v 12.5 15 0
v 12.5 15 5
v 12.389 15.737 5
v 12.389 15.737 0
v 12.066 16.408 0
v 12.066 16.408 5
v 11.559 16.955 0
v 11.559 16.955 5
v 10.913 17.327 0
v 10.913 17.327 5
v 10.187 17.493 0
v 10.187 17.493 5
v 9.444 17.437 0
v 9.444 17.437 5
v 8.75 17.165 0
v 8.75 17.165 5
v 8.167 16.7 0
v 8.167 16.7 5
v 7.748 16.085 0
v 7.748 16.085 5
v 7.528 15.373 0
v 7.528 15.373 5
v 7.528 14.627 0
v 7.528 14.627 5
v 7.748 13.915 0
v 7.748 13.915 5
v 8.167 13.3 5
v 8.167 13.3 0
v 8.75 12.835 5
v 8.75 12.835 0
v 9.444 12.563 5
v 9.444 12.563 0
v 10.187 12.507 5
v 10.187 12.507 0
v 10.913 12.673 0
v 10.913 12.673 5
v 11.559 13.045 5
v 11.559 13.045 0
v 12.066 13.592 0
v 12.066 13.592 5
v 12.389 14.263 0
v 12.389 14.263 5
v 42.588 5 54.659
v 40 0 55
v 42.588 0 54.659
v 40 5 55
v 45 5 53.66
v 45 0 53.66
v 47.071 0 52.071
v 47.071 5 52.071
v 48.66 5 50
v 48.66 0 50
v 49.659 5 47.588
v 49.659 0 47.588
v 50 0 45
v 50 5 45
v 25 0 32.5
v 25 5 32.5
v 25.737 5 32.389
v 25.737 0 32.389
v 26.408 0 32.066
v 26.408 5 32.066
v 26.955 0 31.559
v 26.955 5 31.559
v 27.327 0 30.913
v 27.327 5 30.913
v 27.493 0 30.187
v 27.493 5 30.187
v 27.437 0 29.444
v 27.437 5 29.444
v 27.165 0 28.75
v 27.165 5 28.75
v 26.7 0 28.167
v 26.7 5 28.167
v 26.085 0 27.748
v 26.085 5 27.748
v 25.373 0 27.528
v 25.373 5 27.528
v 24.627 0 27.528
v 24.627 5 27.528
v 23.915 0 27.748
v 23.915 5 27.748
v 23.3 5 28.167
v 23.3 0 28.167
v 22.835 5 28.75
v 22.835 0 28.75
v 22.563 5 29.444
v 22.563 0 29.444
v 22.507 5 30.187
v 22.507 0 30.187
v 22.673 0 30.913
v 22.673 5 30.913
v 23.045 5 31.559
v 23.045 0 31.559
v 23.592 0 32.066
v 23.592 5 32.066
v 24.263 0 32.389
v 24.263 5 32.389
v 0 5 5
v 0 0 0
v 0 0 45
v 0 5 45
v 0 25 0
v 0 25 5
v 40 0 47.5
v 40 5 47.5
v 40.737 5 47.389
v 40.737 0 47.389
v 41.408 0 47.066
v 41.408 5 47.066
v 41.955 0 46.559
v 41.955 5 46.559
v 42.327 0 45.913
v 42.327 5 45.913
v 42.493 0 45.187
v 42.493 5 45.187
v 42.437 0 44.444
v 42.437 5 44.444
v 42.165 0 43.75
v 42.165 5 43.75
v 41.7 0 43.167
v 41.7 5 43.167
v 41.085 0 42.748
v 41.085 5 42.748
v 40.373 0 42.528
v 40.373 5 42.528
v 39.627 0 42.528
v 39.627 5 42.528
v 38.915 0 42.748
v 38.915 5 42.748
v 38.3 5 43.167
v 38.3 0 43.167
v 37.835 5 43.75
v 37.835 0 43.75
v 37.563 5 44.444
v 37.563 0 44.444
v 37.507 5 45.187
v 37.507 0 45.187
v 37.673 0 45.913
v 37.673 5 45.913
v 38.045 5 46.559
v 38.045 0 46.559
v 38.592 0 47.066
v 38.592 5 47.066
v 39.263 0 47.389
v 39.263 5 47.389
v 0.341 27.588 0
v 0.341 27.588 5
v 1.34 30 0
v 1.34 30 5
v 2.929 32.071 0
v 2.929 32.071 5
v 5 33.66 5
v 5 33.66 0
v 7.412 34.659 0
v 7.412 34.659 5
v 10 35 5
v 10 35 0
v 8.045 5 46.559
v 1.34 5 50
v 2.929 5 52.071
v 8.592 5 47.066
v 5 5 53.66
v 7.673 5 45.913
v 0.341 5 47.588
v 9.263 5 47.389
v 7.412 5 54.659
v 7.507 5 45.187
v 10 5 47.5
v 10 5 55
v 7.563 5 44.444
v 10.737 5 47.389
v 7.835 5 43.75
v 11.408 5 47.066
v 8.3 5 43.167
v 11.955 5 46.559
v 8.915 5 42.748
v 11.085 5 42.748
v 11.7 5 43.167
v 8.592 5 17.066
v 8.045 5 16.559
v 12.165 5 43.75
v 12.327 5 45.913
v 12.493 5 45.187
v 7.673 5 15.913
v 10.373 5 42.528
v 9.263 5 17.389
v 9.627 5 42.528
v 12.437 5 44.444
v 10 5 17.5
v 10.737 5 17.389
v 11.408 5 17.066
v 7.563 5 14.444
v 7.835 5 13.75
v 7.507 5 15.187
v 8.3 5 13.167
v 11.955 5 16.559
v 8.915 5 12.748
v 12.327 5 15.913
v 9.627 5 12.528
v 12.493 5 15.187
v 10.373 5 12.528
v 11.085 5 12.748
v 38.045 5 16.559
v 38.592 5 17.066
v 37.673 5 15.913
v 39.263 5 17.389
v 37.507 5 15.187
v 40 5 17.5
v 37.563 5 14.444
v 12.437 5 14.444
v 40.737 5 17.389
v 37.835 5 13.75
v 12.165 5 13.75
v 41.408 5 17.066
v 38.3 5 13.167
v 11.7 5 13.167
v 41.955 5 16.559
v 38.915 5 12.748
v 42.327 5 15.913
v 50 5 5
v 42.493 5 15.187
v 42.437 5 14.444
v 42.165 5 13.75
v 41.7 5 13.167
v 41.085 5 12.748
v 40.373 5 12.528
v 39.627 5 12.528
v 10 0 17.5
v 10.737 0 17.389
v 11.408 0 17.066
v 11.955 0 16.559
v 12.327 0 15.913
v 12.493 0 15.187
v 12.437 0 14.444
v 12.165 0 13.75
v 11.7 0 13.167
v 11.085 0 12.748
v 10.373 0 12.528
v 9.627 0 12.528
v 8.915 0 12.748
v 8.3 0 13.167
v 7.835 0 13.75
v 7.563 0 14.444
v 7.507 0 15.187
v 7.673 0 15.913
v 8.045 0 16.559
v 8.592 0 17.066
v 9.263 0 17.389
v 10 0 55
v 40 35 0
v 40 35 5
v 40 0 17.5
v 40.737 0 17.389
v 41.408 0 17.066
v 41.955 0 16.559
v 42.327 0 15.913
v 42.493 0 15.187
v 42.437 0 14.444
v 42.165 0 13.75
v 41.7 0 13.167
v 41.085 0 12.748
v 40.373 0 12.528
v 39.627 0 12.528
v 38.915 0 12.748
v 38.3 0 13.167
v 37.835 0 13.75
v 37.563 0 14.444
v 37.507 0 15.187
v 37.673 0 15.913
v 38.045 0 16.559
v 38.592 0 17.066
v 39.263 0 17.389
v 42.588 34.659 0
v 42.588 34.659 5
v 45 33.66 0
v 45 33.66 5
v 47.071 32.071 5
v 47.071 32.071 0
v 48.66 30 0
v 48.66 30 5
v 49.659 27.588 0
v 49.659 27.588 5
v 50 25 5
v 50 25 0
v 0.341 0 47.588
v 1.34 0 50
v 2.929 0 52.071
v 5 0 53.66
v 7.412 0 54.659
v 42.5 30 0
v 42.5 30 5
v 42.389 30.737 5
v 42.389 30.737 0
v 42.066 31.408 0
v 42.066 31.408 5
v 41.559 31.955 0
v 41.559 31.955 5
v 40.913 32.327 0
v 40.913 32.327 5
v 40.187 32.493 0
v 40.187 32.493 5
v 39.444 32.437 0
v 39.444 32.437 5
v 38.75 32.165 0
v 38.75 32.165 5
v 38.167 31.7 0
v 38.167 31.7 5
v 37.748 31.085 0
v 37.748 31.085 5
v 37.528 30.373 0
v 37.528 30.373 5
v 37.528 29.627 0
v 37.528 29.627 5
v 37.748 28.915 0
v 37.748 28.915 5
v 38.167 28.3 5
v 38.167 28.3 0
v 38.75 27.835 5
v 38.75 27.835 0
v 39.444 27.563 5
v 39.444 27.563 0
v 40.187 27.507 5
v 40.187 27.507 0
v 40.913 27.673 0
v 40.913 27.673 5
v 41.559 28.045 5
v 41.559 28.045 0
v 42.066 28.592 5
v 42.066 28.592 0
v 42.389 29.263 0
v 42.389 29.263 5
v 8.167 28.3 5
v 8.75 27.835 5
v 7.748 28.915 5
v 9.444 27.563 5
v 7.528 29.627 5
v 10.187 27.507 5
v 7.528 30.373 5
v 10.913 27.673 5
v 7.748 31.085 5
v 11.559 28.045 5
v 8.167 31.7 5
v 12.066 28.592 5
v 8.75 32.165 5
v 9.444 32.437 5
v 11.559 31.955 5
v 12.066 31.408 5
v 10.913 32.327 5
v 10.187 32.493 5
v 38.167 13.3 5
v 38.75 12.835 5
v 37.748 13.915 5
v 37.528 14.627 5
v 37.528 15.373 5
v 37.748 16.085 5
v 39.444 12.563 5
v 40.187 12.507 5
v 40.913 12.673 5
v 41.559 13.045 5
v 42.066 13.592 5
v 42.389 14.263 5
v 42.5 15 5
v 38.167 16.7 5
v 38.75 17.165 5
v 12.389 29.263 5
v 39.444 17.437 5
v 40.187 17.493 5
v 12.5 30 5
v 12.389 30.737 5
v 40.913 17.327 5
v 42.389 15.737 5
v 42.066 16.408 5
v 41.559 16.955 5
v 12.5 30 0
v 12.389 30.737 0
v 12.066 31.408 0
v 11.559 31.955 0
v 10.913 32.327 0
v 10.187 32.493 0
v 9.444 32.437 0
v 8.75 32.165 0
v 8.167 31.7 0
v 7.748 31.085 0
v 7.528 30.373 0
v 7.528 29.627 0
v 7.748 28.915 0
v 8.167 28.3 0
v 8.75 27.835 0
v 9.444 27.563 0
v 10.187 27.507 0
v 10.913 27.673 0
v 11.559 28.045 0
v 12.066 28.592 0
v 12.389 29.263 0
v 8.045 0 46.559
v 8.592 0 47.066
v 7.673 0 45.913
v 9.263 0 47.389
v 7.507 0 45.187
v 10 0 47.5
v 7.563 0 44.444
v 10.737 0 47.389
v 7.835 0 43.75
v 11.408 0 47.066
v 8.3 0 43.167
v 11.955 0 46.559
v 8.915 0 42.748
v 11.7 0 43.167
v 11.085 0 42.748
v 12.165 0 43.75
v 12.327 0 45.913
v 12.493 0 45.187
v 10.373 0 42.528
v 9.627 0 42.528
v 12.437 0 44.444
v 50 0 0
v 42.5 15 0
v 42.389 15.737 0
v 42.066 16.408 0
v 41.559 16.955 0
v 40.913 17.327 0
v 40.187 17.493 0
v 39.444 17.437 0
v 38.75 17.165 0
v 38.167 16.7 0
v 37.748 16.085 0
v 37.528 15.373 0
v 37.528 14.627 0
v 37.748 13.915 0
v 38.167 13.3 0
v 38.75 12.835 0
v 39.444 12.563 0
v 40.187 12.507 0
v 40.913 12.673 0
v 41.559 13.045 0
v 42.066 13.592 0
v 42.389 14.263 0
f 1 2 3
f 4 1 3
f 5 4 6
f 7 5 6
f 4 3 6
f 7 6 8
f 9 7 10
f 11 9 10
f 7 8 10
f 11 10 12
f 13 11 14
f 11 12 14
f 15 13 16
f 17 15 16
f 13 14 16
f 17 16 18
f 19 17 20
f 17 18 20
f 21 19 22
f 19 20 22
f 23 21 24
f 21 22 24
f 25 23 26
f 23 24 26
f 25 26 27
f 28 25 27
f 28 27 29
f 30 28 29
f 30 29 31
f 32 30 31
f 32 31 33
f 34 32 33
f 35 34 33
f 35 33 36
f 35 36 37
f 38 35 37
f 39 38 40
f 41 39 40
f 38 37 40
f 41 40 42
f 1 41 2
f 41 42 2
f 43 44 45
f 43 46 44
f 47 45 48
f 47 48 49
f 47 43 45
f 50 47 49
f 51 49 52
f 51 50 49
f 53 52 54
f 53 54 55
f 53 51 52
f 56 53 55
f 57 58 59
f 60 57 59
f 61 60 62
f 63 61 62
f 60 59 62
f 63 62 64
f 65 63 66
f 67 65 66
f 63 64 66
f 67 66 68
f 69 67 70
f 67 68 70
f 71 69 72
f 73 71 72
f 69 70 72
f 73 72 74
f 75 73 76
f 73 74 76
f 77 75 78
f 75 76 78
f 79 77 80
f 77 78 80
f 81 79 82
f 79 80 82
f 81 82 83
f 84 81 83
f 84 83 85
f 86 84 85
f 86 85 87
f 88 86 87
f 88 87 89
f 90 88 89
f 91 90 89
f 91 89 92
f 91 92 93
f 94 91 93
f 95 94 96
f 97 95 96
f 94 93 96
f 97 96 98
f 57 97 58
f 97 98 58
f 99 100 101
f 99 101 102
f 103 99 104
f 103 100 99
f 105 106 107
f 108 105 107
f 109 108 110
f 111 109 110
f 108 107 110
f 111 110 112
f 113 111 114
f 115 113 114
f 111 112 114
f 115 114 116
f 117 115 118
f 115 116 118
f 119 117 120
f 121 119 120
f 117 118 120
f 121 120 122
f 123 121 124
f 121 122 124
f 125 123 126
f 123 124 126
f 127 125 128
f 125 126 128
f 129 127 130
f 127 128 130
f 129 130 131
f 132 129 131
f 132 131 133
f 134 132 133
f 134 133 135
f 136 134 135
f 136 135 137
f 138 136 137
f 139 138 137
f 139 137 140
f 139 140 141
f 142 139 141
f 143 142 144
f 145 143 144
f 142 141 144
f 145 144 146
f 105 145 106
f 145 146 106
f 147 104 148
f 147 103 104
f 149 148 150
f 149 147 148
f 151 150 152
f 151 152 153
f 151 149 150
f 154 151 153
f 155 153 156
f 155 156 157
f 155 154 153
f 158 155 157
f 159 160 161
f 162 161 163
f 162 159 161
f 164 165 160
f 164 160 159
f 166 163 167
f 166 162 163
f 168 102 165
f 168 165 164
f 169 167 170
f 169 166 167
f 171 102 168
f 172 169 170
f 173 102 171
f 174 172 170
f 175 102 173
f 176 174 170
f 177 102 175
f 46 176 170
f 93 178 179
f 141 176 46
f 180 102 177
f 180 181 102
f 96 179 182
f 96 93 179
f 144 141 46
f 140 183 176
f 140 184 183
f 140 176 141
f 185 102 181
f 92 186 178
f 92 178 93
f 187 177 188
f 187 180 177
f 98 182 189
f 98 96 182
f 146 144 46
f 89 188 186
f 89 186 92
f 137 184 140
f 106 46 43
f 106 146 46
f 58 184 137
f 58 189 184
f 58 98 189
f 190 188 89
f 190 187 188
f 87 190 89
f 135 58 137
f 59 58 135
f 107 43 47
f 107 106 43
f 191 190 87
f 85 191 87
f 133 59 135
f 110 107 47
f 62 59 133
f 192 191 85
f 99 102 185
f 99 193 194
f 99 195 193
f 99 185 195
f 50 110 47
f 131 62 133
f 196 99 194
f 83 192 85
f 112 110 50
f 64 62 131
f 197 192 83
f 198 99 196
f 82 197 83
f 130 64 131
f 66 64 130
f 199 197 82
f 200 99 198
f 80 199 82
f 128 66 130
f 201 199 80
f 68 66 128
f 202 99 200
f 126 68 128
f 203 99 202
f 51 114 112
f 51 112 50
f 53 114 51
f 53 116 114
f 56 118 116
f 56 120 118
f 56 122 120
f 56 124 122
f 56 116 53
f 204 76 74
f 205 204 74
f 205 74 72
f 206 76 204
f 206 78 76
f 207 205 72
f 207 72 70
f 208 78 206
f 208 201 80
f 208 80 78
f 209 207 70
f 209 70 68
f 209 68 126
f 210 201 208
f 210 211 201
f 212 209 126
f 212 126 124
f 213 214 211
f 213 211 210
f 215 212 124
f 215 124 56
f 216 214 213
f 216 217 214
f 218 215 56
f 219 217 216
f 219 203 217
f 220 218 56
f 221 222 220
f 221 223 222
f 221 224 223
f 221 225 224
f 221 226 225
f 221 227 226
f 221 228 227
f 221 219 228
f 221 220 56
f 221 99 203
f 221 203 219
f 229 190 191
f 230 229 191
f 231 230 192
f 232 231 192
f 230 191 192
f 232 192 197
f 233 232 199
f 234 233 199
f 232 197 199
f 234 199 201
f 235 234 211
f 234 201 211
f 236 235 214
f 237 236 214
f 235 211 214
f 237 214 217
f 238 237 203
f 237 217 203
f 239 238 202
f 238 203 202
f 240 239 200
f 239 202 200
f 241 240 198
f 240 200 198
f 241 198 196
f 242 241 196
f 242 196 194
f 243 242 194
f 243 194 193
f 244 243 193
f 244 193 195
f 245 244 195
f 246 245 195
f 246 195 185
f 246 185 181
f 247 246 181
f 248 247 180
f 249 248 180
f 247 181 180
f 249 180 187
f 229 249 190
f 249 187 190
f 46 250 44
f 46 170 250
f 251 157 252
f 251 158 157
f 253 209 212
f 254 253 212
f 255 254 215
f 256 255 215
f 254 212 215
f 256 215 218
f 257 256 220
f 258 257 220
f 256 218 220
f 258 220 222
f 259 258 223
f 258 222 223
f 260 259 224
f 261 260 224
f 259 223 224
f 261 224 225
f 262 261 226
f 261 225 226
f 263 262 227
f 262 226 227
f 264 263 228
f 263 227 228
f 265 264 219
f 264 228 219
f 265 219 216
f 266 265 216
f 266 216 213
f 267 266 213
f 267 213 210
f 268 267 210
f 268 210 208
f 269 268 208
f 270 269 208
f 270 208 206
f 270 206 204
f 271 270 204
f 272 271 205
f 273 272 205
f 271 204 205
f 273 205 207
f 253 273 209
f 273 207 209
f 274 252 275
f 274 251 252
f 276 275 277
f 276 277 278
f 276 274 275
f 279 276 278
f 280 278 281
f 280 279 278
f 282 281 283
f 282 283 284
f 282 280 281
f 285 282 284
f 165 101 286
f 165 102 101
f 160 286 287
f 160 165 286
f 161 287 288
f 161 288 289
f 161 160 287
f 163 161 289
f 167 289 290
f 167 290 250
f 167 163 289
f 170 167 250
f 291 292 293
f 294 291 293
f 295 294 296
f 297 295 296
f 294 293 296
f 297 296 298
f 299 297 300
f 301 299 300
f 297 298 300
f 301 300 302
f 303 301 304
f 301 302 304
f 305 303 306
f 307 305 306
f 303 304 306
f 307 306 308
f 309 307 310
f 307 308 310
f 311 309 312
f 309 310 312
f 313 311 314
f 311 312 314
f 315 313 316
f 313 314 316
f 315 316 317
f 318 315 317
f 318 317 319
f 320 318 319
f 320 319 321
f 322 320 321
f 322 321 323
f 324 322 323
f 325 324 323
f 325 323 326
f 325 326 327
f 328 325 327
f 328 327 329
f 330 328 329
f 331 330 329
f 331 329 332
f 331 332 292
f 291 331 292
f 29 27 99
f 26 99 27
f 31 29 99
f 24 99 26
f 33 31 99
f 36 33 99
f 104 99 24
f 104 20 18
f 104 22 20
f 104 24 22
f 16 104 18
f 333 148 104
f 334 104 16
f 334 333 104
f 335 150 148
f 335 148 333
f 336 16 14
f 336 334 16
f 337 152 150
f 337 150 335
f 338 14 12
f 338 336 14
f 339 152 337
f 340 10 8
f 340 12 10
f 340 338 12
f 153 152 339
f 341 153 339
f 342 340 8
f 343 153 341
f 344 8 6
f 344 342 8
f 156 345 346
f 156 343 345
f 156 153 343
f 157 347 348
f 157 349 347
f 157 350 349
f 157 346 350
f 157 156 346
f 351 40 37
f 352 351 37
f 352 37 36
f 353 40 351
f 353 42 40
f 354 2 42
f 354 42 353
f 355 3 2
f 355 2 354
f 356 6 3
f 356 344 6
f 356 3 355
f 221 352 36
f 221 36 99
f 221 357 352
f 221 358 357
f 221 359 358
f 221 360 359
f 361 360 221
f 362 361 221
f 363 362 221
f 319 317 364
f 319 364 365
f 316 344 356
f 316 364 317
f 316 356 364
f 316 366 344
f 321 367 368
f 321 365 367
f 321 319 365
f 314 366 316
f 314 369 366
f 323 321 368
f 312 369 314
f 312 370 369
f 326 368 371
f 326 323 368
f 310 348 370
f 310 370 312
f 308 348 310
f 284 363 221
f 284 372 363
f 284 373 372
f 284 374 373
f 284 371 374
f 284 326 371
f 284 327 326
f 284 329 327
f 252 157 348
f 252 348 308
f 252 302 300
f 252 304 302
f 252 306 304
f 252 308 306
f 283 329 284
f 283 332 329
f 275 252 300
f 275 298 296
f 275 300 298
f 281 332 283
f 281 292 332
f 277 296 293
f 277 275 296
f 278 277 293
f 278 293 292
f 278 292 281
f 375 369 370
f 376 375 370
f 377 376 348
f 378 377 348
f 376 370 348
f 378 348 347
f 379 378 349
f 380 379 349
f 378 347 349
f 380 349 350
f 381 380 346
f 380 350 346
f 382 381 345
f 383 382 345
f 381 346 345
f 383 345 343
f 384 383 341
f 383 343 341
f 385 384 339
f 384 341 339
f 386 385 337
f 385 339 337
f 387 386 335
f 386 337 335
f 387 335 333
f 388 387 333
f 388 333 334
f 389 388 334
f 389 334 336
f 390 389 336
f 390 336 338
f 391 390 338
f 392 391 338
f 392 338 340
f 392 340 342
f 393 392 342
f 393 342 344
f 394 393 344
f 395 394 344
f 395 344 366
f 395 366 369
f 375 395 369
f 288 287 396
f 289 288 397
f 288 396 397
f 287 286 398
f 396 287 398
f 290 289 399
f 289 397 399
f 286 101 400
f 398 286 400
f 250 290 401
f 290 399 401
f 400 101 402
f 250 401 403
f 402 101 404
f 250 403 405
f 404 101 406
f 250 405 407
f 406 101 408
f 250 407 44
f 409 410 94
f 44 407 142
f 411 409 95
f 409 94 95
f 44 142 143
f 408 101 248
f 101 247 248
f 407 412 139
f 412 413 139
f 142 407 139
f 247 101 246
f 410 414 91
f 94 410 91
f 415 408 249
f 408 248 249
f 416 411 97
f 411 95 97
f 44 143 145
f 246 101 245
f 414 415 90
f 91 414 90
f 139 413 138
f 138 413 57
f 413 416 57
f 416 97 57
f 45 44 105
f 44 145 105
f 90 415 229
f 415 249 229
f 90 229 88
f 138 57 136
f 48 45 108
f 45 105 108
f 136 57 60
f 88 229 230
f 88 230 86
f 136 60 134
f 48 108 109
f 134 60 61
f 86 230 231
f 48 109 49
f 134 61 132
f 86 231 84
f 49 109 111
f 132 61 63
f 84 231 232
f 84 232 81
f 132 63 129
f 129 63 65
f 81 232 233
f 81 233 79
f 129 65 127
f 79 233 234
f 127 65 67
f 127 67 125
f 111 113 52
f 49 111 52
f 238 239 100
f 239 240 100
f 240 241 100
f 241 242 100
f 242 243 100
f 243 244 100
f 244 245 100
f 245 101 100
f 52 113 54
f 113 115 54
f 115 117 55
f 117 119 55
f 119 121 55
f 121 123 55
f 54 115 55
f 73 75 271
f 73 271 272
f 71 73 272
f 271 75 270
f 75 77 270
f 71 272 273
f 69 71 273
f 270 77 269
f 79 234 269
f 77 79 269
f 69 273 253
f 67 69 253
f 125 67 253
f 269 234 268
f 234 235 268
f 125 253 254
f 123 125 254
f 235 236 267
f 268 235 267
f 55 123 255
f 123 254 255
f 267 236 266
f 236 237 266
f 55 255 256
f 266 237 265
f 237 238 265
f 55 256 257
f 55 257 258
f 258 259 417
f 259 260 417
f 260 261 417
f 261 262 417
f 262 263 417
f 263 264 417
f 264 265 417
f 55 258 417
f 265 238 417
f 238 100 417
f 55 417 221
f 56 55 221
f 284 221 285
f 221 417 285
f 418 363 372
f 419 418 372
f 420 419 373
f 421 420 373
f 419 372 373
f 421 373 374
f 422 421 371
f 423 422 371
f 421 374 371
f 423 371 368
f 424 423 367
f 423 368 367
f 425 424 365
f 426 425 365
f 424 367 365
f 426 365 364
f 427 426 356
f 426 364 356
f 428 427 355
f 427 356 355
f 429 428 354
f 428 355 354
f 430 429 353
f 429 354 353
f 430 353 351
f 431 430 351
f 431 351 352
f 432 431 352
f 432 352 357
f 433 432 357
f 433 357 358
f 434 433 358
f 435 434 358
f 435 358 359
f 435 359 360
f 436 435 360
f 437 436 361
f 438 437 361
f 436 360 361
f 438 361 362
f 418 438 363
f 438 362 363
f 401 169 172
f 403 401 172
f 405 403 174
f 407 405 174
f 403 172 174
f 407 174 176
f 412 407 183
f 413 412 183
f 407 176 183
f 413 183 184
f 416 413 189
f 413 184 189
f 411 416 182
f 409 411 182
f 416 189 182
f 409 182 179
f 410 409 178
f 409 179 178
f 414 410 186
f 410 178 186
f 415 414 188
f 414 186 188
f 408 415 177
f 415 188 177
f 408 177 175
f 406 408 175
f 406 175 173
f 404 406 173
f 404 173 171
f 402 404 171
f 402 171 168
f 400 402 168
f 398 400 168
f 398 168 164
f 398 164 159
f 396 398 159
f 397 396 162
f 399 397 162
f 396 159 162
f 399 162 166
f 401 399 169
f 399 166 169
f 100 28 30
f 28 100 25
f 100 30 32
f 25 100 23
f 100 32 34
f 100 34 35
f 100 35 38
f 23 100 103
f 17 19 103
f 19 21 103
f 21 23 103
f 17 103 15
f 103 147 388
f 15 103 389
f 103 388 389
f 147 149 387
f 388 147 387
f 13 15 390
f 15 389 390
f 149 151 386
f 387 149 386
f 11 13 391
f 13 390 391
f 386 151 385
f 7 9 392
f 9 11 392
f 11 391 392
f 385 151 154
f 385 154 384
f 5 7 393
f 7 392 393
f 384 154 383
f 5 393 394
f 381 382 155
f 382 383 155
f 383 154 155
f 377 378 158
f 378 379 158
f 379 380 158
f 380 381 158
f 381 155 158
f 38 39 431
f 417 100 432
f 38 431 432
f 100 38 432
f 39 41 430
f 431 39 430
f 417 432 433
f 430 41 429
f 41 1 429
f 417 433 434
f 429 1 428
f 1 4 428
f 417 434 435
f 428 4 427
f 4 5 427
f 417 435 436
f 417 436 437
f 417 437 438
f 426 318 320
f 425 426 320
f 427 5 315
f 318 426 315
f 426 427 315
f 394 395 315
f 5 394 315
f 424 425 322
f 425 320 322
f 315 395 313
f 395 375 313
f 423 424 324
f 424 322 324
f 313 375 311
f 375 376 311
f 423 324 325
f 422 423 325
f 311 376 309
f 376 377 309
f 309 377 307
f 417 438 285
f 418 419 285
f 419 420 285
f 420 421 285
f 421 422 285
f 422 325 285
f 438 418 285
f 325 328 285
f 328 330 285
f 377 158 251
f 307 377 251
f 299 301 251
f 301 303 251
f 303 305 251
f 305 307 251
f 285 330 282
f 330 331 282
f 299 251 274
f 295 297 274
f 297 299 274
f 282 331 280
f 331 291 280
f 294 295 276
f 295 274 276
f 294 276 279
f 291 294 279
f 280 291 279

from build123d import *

# Parameters (mm, degrees)
SKETCH1_W           = 50
SKETCH1_H           = 60
BOSS_EXTRUDE1_DEPTH = 5
SKETCH2_W           = 50
SKETCH2_H           = 5
BOSS_EXTRUDE2_DEPTH = 50
SKETCH3_W           = 50
SKETCH3_H           = 5
CUT_EXTRUDE1_DEPTH  = 5
SKETCH4_R           = 2.5
CUT_EXTRUDE2_DEPTH  = 5
SKETCH5_R           = 2.5
CUT_EXTRUDE3_DEPTH  = 5
FILLET1_R           = 10
SKETCH7_W           = 50
SKETCH7_H           = 5
CUT_EXTRUDE4_DEPTH  = 20
FILLET2_R           = 10
SKETCH8_R           = 2.5
CUT_EXTRUDE5_DEPTH  = 20
SKETCH9_R           = 2.5
BOSS_EXTRUDE3_DEPTH = 5


with BuildPart() as part:
    # Sketch1 → Boss-Extrude1 (new body)
    with BuildSketch(Plane.XY):
        with Locations((25, 30)):
            Rectangle(SKETCH1_W, SKETCH1_H)
    extrude(amount=BOSS_EXTRUDE1_DEPTH)

    # Sketch2 → Boss-Extrude2 (add)
    with BuildSketch(Plane.XY.offset(5)):
        with Locations((25, 2.5)):
            Rectangle(SKETCH2_W, SKETCH2_H)
    extrude(amount=BOSS_EXTRUDE2_DEPTH)

    # Sketch3 → Cut-Extrude1 (cut)
    with BuildSketch(Plane(origin=(0, 60, 0), x_dir=(1, 0, 0), z_dir=(0, 1, 0))):
        with Locations((25, -2.5)):
            Rectangle(SKETCH3_W, SKETCH3_H)
    extrude(amount=-CUT_EXTRUDE1_DEPTH, mode=Mode.SUBTRACT)

    # Sketch4 → Cut-Extrude2 (cut)
    with BuildSketch(Plane(origin=(0, 5, 0), x_dir=(1, 0, 0), z_dir=(0, 1, 0))):
        with Locations(Location((10, -15, 0), (0, 0, 270))):
            Circle(SKETCH4_R)
        with Locations(Location((25, -30, 0), (0, 0, 270))):
            Circle(SKETCH4_R)
        with Locations(Location((40, -15, 0), (0, 0, 270))):
            Circle(SKETCH4_R)
        with Locations(Location((40, -45, 0), (0, 0, 270))):
            Circle(SKETCH4_R)
        with Locations(Location((10, -45, 0), (0, 0, 270))):
            Circle(SKETCH4_R)
    extrude(amount=-CUT_EXTRUDE2_DEPTH, mode=Mode.SUBTRACT)

    # Sketch5 → Cut-Extrude3 (cut)
    with BuildSketch(Plane.XY.offset(5)):
        with Locations((10, 45)):
            Circle(SKETCH5_R)
        with Locations((25, 30)):
            Circle(SKETCH5_R)
        with Locations((40, 45)):
            Circle(SKETCH5_R)
        with Locations((40, 15)):
            Circle(SKETCH5_R)
        with Locations((10, 15)):
            Circle(SKETCH5_R)
    extrude(amount=-CUT_EXTRUDE3_DEPTH, mode=Mode.SUBTRACT)

    # Fillet1
    fillet1_edges = [part.edges().sort_by_distance(p)[0] for p in [
        (50, 55, 2.5),
        (0, 55, 2.5),
        (0, 2.5, 55),
        (50, 2.5, 55),
    ]]
    fillet(fillet1_edges, radius=FILLET1_R)

    # Sketch7 → Cut-Extrude4 (cut)
    with BuildSketch(Plane(origin=(0, 55, 0), x_dir=(1, 0, 0), z_dir=(0, 1, 0))):
        with Locations((25, -2.5)):
            Rectangle(SKETCH7_W, SKETCH7_H)
    extrude(amount=-CUT_EXTRUDE4_DEPTH, mode=Mode.SUBTRACT)

    # Fillet2
    fillet2_edges = [part.edges().sort_by_distance(p)[0] for p in [
        (50, 35, 2.5),
        (0, 35, 2.5),
    ]]
    fillet(fillet2_edges, radius=FILLET2_R)

    # Sketch8 → Cut-Extrude5 (cut)
    with BuildSketch(Plane.XY.offset(5)):
        with Locations((10, 30)):
            Circle(SKETCH8_R)
        with Locations((40, 30)):
            Circle(SKETCH8_R)
    extrude(amount=-CUT_EXTRUDE5_DEPTH, mode=Mode.SUBTRACT)

    # Sketch9 → Boss-Extrude3 (add, through all)
    with BuildSketch(Plane.XY.offset(5)):
        with Locations((25, 30)):
            Circle(SKETCH9_R)
    extrude(amount=-BOSS_EXTRUDE3_DEPTH)


solid = part.part
